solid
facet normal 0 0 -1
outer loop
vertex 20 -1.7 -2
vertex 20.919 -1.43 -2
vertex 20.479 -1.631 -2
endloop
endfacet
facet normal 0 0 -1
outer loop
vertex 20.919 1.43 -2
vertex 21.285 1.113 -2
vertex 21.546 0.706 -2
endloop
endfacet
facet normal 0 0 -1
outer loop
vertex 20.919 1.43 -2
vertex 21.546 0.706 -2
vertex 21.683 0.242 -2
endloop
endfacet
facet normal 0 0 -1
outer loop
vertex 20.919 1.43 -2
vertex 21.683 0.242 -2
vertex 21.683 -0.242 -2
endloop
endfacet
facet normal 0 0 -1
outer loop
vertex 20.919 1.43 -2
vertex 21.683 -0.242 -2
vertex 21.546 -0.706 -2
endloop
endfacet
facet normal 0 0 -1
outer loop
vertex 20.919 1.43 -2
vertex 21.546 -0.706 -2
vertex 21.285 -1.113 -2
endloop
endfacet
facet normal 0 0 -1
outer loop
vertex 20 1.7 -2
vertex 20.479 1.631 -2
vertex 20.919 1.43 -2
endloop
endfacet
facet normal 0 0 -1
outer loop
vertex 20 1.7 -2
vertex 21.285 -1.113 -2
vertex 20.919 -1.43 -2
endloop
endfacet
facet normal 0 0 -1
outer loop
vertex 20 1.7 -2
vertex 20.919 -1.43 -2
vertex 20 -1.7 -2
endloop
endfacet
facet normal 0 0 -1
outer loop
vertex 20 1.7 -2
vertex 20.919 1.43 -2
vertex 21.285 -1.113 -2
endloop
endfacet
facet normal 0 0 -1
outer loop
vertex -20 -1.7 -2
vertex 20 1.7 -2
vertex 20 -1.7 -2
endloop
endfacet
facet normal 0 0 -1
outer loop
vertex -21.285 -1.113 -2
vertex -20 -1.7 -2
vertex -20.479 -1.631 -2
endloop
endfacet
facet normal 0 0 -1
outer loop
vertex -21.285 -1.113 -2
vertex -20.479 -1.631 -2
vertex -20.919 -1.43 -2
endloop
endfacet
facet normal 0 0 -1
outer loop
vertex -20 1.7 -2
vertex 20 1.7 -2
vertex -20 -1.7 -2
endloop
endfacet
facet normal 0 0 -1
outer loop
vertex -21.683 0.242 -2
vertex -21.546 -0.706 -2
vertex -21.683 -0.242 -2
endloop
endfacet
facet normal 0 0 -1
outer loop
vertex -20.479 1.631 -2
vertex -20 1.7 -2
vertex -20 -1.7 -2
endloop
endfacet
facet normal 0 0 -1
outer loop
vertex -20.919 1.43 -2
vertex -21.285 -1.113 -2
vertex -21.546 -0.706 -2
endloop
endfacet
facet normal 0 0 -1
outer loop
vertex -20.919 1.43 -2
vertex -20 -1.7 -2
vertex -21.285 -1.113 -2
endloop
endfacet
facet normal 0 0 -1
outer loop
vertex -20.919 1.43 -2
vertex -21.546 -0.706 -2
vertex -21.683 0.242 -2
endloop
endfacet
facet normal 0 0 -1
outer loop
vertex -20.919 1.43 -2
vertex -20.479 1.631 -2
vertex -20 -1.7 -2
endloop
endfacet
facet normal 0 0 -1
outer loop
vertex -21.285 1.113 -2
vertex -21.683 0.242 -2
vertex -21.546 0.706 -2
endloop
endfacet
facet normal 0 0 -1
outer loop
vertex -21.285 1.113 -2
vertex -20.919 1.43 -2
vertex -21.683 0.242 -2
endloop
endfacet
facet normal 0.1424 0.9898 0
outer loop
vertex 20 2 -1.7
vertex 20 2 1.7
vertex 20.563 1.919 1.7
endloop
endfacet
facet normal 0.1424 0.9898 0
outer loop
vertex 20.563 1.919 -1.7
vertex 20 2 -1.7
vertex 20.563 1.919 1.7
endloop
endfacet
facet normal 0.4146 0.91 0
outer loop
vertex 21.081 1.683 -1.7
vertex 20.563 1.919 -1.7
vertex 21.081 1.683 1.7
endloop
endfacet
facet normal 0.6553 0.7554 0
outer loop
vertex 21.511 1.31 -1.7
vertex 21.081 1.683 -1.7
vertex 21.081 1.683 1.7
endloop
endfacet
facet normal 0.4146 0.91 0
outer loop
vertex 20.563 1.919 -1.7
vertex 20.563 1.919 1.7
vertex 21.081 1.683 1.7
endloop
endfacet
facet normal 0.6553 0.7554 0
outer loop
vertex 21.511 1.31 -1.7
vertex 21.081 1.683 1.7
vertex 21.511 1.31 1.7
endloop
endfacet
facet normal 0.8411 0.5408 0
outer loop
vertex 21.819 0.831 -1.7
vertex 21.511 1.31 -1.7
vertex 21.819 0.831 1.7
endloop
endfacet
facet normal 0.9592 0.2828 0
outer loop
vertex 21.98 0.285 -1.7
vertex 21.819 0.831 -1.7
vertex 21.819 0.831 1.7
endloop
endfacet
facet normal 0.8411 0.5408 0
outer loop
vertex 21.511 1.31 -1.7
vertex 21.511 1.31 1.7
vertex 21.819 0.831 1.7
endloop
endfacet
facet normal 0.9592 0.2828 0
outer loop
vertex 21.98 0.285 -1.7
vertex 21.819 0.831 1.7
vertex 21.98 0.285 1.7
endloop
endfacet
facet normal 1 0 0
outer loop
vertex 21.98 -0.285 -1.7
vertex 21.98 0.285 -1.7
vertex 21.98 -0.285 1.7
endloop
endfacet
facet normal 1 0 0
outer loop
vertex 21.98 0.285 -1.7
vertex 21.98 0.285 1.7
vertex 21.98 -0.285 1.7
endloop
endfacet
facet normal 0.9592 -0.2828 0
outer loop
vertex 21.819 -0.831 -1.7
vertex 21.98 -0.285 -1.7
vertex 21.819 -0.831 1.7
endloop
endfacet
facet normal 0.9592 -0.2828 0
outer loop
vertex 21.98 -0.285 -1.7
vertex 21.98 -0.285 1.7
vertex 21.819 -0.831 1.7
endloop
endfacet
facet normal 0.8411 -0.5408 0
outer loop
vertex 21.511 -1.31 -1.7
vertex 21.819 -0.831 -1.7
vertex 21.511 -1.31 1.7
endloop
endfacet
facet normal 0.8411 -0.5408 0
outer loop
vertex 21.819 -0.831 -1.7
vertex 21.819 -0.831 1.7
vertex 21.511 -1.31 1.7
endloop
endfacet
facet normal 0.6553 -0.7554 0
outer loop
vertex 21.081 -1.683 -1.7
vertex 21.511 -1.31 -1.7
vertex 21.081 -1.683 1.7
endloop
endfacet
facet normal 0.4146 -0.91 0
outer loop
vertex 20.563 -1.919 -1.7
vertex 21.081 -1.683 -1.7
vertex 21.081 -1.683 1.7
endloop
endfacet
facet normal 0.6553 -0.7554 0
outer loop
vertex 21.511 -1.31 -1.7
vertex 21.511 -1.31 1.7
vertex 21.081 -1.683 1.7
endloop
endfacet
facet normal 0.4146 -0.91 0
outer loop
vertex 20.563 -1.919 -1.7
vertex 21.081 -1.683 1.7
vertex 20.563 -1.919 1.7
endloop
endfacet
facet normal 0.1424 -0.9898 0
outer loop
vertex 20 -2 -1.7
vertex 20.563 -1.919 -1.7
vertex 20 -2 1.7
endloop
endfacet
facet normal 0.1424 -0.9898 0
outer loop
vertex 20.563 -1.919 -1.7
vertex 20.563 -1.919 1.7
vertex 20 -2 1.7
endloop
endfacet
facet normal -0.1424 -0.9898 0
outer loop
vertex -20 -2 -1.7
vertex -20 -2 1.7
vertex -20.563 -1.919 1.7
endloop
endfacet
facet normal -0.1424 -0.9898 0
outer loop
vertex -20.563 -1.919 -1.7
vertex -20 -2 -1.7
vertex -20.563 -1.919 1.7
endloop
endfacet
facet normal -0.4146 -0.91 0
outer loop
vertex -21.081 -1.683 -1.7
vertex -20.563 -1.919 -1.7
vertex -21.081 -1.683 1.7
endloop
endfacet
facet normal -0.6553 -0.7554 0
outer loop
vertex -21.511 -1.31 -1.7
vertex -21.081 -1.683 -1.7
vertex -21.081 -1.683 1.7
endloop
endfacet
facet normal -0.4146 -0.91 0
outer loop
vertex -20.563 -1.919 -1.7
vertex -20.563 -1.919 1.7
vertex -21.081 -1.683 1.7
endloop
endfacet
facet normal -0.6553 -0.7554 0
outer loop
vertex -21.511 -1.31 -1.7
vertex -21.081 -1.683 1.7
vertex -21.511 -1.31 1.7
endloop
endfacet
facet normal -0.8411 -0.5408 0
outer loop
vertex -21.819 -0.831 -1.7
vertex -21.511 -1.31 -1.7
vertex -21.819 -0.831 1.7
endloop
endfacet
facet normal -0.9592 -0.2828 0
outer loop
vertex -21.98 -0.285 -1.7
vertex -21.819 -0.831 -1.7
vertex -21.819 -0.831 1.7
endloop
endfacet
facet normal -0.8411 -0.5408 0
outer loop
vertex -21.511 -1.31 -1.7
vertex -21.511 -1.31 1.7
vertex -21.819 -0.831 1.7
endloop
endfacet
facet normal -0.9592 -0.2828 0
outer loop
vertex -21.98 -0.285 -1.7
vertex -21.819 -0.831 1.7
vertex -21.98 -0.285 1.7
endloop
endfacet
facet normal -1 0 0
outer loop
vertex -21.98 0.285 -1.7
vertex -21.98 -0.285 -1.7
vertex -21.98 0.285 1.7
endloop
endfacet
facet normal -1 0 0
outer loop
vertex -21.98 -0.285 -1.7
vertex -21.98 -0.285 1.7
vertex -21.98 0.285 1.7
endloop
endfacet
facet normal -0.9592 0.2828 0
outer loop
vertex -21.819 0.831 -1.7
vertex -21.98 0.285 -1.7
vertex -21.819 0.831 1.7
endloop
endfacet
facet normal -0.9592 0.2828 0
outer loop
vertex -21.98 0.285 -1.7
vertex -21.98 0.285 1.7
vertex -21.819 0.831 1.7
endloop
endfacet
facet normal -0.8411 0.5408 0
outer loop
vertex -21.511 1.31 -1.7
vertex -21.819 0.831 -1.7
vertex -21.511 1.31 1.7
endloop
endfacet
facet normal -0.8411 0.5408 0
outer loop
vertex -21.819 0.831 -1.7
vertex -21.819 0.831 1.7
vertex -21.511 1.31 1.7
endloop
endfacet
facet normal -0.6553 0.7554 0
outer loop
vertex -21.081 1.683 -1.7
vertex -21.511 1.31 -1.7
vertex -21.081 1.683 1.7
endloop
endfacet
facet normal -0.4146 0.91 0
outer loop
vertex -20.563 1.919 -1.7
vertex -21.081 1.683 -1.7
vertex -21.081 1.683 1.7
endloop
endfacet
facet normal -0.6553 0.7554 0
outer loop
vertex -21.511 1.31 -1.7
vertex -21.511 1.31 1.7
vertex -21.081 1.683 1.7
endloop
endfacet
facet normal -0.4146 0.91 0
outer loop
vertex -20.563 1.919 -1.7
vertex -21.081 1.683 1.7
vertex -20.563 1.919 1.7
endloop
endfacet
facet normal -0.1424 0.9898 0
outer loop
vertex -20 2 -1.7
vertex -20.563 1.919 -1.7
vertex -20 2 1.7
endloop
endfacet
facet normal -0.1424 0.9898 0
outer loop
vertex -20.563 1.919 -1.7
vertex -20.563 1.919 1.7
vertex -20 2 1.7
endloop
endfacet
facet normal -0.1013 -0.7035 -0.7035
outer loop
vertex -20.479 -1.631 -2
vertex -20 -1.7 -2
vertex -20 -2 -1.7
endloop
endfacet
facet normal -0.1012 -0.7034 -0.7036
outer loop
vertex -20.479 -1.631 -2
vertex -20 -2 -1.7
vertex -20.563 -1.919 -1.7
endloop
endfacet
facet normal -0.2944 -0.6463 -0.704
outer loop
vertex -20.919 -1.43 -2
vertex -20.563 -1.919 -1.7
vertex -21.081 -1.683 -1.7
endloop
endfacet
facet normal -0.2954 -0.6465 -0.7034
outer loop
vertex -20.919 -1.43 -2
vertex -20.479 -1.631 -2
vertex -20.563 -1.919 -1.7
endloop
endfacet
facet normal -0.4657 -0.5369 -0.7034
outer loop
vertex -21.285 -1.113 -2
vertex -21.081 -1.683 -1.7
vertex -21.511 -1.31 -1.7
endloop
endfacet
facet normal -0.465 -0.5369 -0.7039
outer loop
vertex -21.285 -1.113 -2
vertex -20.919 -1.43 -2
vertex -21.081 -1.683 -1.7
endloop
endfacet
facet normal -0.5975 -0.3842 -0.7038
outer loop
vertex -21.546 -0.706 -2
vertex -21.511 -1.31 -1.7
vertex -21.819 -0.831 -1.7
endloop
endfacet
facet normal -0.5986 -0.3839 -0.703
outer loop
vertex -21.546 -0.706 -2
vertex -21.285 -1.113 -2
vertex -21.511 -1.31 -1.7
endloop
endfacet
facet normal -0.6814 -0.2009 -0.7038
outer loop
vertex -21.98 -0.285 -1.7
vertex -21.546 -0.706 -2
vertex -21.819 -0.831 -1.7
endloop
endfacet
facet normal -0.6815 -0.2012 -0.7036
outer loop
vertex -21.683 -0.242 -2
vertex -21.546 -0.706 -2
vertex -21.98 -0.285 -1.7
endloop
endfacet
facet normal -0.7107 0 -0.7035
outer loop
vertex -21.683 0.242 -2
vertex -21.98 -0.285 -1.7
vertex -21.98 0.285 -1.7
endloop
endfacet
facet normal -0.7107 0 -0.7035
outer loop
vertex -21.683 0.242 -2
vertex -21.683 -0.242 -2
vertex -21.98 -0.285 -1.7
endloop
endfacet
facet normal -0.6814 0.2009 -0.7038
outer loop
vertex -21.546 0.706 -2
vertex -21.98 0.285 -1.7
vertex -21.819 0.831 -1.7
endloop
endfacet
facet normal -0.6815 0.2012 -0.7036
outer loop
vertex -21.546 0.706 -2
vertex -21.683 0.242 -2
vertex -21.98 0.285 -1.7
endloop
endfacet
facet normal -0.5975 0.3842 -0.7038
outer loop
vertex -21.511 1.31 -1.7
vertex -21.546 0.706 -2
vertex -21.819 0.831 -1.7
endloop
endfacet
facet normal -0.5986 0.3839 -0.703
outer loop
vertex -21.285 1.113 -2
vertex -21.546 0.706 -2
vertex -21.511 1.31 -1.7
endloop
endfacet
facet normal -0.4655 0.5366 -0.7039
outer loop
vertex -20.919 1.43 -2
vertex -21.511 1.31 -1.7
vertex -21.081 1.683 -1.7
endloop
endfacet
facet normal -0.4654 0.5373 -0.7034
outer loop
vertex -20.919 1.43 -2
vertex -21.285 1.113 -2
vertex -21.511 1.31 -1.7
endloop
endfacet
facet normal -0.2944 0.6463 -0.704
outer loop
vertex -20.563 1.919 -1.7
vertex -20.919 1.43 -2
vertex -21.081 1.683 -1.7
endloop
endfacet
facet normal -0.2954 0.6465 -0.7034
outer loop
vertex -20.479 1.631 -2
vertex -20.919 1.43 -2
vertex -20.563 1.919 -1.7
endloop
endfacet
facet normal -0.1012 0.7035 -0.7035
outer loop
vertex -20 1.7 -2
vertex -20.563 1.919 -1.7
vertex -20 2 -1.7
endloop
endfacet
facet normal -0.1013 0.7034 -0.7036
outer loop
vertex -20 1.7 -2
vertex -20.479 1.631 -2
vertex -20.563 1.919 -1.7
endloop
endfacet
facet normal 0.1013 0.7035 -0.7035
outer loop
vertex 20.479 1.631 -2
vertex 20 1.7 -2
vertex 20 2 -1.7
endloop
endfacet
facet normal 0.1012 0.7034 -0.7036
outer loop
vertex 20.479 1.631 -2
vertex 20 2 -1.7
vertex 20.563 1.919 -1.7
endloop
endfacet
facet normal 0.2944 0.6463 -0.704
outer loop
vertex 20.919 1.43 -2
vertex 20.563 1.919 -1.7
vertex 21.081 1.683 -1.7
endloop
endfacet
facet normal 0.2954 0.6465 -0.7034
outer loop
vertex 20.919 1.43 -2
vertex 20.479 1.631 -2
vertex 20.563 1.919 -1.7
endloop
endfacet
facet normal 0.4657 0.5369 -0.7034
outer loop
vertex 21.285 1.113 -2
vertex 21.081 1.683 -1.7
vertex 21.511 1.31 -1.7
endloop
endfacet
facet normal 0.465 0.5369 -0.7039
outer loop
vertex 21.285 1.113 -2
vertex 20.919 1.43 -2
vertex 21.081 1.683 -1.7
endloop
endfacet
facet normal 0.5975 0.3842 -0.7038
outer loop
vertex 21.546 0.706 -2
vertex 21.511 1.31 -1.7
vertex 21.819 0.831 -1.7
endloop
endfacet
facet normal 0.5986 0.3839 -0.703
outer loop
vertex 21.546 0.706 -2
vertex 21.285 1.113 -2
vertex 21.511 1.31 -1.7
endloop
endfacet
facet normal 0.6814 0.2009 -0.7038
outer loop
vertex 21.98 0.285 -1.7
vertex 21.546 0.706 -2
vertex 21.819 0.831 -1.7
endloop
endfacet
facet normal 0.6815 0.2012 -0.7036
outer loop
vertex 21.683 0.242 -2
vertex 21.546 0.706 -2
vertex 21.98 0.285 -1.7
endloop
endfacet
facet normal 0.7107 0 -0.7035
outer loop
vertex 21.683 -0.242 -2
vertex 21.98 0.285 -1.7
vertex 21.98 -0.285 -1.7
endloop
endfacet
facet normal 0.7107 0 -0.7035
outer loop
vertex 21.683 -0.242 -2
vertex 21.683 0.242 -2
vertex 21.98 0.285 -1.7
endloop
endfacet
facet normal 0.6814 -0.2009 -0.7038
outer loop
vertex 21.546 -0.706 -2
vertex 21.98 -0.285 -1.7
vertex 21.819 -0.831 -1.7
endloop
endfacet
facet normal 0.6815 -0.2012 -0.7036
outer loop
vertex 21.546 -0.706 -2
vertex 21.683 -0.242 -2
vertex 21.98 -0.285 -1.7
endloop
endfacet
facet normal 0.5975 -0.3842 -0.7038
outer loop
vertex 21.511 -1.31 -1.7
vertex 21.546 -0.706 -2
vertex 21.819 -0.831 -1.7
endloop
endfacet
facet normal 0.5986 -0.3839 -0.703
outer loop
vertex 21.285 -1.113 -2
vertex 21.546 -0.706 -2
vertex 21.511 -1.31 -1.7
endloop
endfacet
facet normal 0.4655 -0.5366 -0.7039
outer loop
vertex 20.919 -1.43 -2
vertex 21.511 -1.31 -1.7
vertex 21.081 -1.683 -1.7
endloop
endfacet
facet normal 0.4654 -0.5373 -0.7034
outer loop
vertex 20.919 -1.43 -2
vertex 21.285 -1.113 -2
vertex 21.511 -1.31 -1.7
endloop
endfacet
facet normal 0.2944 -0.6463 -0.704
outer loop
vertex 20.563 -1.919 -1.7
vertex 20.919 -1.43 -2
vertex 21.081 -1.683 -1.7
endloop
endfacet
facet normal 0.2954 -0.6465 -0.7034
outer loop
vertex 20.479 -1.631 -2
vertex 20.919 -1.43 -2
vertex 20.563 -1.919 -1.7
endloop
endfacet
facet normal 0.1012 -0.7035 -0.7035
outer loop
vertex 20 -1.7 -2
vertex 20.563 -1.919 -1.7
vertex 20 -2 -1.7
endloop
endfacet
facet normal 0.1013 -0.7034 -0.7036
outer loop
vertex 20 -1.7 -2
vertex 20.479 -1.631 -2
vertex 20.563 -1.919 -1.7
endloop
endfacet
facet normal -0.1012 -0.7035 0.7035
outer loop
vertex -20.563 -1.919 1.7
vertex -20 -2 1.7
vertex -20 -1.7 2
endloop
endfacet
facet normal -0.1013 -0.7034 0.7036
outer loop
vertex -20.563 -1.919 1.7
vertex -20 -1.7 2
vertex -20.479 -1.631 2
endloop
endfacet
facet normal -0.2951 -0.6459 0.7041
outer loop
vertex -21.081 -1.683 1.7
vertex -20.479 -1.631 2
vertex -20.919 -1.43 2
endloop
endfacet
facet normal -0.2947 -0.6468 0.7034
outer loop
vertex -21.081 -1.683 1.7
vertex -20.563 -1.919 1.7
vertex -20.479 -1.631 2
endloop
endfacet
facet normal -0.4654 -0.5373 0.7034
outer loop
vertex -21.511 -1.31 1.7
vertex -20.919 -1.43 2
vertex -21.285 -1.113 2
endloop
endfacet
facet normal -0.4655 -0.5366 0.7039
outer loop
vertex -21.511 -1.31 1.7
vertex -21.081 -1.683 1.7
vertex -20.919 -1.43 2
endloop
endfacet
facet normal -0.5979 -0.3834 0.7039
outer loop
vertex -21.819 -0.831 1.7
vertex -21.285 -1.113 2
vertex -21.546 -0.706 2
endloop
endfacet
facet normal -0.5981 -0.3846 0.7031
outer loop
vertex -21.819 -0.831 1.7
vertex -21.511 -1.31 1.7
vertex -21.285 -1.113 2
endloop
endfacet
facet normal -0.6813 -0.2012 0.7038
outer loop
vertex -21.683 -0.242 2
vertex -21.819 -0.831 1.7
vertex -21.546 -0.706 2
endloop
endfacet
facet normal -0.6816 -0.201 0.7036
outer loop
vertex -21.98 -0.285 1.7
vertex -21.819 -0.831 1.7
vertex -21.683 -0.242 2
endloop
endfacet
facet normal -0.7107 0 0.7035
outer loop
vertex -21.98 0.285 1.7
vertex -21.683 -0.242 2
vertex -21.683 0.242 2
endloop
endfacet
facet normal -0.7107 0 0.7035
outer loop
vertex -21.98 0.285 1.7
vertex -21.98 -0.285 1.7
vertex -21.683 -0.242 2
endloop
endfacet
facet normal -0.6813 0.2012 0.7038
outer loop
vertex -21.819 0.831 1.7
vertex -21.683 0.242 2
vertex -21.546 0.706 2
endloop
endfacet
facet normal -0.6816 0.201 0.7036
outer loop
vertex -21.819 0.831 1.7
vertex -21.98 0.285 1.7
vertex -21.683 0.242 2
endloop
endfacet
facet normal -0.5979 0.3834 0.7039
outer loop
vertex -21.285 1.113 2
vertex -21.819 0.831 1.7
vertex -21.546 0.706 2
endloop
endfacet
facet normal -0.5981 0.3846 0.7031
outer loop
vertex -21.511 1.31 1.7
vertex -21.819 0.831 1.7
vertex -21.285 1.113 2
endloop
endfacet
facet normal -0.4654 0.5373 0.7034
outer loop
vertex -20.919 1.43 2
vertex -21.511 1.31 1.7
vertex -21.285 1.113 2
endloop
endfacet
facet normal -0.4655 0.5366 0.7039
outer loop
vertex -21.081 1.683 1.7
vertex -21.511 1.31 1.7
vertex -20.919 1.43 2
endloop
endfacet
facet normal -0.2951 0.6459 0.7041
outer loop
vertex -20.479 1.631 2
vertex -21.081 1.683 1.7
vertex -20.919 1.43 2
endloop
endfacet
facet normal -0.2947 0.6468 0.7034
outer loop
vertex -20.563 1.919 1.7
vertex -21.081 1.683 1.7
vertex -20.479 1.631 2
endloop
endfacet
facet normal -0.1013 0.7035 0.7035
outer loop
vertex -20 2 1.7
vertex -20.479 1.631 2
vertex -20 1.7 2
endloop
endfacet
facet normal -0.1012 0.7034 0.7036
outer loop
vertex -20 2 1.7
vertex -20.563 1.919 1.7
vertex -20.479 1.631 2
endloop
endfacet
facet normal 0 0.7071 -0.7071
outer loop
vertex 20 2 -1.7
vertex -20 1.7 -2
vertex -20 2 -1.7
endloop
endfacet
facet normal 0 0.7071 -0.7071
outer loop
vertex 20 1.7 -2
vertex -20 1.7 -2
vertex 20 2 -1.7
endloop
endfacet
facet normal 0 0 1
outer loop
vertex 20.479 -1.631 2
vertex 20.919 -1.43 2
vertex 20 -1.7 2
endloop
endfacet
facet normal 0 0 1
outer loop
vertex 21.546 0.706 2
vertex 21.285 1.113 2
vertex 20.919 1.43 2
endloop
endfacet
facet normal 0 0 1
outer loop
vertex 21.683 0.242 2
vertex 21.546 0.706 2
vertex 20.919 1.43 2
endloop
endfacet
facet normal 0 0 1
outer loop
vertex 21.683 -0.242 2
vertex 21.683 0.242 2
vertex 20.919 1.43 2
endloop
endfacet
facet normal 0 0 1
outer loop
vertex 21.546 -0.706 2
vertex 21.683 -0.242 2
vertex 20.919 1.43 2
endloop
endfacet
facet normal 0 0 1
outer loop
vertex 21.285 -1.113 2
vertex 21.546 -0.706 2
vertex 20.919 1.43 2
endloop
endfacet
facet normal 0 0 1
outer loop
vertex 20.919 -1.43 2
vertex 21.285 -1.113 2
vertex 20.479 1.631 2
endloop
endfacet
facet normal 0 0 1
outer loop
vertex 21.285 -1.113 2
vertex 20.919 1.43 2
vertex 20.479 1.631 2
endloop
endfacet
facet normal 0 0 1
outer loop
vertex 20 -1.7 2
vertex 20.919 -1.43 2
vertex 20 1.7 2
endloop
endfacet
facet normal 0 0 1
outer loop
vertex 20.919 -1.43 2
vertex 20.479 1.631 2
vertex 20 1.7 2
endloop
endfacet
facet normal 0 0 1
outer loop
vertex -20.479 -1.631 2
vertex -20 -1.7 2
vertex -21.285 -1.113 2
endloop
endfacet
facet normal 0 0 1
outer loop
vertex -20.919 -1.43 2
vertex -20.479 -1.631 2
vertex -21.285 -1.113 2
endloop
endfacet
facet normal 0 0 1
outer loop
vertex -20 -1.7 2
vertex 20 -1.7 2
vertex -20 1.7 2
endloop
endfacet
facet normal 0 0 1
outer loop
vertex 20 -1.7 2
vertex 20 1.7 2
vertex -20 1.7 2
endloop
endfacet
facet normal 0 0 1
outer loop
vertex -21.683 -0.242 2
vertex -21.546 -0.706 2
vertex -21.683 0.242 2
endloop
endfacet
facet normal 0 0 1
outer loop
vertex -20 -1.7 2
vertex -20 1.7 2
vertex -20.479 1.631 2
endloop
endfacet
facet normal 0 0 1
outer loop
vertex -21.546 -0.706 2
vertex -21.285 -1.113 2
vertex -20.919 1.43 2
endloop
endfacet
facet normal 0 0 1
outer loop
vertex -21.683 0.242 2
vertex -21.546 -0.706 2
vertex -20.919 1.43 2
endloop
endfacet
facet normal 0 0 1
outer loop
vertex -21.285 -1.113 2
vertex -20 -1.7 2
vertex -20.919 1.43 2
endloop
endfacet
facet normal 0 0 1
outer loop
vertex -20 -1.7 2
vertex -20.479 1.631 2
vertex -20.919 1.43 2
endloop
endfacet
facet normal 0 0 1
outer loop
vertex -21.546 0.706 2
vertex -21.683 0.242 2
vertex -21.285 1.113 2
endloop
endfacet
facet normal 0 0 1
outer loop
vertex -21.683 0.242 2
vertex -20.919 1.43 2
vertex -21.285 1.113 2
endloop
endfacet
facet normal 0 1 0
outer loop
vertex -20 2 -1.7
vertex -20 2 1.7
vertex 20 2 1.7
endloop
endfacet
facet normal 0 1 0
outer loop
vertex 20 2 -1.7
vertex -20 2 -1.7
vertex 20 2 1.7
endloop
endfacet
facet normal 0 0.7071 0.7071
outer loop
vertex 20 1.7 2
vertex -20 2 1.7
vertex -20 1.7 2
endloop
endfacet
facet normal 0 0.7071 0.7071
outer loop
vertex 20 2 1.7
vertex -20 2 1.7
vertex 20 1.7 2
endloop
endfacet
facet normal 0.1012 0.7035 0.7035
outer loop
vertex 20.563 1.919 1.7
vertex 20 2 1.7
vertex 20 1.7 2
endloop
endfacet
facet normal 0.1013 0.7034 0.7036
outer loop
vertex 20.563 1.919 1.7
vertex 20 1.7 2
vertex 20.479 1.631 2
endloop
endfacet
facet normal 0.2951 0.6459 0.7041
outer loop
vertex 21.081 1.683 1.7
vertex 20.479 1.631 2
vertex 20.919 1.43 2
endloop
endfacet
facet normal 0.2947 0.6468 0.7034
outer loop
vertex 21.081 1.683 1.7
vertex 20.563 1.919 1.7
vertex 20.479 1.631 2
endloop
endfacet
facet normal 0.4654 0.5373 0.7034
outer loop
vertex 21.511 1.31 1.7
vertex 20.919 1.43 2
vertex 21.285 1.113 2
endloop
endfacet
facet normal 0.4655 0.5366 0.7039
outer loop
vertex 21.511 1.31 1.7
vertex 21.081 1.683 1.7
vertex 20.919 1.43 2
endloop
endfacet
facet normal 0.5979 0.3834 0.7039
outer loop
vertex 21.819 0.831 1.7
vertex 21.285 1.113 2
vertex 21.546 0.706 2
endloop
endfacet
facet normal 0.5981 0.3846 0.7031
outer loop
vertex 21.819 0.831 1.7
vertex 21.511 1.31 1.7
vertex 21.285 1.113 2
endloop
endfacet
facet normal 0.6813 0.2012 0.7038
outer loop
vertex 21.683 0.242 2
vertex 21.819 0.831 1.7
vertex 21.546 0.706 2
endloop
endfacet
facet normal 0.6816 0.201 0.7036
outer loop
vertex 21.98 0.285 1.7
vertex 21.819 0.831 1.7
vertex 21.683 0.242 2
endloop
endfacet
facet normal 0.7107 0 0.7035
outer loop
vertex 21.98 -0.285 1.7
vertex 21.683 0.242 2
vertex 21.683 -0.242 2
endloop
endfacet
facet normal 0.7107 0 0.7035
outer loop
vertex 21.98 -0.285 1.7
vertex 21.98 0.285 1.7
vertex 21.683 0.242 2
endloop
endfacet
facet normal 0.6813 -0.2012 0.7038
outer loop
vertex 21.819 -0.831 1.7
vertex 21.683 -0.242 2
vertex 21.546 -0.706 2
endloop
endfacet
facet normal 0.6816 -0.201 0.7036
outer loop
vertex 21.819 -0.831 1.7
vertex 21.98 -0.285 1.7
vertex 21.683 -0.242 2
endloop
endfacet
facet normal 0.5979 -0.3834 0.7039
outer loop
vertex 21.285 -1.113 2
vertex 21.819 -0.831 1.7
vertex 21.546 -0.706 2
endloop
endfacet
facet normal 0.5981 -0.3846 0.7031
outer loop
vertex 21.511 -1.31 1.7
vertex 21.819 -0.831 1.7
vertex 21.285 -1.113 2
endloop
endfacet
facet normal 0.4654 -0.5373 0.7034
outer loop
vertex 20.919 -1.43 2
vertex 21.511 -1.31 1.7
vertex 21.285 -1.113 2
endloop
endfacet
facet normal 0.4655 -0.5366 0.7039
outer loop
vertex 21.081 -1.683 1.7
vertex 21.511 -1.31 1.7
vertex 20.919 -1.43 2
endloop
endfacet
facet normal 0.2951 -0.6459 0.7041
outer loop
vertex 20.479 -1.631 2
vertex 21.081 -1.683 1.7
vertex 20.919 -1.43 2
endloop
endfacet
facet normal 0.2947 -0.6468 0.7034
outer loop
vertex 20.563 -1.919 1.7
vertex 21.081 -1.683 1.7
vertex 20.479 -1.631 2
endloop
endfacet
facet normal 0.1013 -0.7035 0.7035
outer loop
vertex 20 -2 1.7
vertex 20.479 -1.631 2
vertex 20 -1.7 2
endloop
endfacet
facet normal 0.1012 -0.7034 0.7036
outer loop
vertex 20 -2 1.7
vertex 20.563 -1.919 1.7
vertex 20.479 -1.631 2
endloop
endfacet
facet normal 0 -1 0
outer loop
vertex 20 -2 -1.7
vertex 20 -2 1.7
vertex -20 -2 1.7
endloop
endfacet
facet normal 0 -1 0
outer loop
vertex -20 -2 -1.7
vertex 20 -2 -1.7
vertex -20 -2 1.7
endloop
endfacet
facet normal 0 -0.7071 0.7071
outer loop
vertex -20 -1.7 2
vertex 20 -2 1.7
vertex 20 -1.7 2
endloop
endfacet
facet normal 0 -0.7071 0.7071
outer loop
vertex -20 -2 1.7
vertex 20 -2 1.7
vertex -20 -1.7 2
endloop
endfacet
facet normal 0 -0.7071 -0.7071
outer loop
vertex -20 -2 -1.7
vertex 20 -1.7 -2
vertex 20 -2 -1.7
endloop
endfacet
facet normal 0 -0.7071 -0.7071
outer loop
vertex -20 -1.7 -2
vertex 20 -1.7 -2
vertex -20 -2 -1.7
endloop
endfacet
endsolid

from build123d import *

# Parameters (mm, degrees)
EXTRUDE_1_DEPTH = 2
CHAMFER_1_SIZE  = 0.3


with BuildPart() as part:
    # 草图1 → 凸台-拉伸1 (new, symmetric)
    with BuildSketch(Plane.XY):
        with BuildLine():
            Line((-20, 2), (20, 2))
            ThreePointArc((20, 2), (22, 0), (20, -2))
            Line((20, -2), (-20, -2))
            ThreePointArc((-20, -2), (-22, 0), (-20, 2))
        make_face()
    extrude(amount=EXTRUDE_1_DEPTH, both=True)

    # 倒角1
    chamfer_1_edges = [part.edges().sort_by_distance(p)[0] for p in [
        (22, 0, 2),
        (0, 2, 2),
        (-22, 0, 2),
        (0, 2, -2),
        (22, 0, -2),
        (0, -2, -2),
        (-22, 0, -2),
        (0, -2, 2),
    ]]
    chamfer(chamfer_1_edges, length=CHAMFER_1_SIZE)


solid = part.part
